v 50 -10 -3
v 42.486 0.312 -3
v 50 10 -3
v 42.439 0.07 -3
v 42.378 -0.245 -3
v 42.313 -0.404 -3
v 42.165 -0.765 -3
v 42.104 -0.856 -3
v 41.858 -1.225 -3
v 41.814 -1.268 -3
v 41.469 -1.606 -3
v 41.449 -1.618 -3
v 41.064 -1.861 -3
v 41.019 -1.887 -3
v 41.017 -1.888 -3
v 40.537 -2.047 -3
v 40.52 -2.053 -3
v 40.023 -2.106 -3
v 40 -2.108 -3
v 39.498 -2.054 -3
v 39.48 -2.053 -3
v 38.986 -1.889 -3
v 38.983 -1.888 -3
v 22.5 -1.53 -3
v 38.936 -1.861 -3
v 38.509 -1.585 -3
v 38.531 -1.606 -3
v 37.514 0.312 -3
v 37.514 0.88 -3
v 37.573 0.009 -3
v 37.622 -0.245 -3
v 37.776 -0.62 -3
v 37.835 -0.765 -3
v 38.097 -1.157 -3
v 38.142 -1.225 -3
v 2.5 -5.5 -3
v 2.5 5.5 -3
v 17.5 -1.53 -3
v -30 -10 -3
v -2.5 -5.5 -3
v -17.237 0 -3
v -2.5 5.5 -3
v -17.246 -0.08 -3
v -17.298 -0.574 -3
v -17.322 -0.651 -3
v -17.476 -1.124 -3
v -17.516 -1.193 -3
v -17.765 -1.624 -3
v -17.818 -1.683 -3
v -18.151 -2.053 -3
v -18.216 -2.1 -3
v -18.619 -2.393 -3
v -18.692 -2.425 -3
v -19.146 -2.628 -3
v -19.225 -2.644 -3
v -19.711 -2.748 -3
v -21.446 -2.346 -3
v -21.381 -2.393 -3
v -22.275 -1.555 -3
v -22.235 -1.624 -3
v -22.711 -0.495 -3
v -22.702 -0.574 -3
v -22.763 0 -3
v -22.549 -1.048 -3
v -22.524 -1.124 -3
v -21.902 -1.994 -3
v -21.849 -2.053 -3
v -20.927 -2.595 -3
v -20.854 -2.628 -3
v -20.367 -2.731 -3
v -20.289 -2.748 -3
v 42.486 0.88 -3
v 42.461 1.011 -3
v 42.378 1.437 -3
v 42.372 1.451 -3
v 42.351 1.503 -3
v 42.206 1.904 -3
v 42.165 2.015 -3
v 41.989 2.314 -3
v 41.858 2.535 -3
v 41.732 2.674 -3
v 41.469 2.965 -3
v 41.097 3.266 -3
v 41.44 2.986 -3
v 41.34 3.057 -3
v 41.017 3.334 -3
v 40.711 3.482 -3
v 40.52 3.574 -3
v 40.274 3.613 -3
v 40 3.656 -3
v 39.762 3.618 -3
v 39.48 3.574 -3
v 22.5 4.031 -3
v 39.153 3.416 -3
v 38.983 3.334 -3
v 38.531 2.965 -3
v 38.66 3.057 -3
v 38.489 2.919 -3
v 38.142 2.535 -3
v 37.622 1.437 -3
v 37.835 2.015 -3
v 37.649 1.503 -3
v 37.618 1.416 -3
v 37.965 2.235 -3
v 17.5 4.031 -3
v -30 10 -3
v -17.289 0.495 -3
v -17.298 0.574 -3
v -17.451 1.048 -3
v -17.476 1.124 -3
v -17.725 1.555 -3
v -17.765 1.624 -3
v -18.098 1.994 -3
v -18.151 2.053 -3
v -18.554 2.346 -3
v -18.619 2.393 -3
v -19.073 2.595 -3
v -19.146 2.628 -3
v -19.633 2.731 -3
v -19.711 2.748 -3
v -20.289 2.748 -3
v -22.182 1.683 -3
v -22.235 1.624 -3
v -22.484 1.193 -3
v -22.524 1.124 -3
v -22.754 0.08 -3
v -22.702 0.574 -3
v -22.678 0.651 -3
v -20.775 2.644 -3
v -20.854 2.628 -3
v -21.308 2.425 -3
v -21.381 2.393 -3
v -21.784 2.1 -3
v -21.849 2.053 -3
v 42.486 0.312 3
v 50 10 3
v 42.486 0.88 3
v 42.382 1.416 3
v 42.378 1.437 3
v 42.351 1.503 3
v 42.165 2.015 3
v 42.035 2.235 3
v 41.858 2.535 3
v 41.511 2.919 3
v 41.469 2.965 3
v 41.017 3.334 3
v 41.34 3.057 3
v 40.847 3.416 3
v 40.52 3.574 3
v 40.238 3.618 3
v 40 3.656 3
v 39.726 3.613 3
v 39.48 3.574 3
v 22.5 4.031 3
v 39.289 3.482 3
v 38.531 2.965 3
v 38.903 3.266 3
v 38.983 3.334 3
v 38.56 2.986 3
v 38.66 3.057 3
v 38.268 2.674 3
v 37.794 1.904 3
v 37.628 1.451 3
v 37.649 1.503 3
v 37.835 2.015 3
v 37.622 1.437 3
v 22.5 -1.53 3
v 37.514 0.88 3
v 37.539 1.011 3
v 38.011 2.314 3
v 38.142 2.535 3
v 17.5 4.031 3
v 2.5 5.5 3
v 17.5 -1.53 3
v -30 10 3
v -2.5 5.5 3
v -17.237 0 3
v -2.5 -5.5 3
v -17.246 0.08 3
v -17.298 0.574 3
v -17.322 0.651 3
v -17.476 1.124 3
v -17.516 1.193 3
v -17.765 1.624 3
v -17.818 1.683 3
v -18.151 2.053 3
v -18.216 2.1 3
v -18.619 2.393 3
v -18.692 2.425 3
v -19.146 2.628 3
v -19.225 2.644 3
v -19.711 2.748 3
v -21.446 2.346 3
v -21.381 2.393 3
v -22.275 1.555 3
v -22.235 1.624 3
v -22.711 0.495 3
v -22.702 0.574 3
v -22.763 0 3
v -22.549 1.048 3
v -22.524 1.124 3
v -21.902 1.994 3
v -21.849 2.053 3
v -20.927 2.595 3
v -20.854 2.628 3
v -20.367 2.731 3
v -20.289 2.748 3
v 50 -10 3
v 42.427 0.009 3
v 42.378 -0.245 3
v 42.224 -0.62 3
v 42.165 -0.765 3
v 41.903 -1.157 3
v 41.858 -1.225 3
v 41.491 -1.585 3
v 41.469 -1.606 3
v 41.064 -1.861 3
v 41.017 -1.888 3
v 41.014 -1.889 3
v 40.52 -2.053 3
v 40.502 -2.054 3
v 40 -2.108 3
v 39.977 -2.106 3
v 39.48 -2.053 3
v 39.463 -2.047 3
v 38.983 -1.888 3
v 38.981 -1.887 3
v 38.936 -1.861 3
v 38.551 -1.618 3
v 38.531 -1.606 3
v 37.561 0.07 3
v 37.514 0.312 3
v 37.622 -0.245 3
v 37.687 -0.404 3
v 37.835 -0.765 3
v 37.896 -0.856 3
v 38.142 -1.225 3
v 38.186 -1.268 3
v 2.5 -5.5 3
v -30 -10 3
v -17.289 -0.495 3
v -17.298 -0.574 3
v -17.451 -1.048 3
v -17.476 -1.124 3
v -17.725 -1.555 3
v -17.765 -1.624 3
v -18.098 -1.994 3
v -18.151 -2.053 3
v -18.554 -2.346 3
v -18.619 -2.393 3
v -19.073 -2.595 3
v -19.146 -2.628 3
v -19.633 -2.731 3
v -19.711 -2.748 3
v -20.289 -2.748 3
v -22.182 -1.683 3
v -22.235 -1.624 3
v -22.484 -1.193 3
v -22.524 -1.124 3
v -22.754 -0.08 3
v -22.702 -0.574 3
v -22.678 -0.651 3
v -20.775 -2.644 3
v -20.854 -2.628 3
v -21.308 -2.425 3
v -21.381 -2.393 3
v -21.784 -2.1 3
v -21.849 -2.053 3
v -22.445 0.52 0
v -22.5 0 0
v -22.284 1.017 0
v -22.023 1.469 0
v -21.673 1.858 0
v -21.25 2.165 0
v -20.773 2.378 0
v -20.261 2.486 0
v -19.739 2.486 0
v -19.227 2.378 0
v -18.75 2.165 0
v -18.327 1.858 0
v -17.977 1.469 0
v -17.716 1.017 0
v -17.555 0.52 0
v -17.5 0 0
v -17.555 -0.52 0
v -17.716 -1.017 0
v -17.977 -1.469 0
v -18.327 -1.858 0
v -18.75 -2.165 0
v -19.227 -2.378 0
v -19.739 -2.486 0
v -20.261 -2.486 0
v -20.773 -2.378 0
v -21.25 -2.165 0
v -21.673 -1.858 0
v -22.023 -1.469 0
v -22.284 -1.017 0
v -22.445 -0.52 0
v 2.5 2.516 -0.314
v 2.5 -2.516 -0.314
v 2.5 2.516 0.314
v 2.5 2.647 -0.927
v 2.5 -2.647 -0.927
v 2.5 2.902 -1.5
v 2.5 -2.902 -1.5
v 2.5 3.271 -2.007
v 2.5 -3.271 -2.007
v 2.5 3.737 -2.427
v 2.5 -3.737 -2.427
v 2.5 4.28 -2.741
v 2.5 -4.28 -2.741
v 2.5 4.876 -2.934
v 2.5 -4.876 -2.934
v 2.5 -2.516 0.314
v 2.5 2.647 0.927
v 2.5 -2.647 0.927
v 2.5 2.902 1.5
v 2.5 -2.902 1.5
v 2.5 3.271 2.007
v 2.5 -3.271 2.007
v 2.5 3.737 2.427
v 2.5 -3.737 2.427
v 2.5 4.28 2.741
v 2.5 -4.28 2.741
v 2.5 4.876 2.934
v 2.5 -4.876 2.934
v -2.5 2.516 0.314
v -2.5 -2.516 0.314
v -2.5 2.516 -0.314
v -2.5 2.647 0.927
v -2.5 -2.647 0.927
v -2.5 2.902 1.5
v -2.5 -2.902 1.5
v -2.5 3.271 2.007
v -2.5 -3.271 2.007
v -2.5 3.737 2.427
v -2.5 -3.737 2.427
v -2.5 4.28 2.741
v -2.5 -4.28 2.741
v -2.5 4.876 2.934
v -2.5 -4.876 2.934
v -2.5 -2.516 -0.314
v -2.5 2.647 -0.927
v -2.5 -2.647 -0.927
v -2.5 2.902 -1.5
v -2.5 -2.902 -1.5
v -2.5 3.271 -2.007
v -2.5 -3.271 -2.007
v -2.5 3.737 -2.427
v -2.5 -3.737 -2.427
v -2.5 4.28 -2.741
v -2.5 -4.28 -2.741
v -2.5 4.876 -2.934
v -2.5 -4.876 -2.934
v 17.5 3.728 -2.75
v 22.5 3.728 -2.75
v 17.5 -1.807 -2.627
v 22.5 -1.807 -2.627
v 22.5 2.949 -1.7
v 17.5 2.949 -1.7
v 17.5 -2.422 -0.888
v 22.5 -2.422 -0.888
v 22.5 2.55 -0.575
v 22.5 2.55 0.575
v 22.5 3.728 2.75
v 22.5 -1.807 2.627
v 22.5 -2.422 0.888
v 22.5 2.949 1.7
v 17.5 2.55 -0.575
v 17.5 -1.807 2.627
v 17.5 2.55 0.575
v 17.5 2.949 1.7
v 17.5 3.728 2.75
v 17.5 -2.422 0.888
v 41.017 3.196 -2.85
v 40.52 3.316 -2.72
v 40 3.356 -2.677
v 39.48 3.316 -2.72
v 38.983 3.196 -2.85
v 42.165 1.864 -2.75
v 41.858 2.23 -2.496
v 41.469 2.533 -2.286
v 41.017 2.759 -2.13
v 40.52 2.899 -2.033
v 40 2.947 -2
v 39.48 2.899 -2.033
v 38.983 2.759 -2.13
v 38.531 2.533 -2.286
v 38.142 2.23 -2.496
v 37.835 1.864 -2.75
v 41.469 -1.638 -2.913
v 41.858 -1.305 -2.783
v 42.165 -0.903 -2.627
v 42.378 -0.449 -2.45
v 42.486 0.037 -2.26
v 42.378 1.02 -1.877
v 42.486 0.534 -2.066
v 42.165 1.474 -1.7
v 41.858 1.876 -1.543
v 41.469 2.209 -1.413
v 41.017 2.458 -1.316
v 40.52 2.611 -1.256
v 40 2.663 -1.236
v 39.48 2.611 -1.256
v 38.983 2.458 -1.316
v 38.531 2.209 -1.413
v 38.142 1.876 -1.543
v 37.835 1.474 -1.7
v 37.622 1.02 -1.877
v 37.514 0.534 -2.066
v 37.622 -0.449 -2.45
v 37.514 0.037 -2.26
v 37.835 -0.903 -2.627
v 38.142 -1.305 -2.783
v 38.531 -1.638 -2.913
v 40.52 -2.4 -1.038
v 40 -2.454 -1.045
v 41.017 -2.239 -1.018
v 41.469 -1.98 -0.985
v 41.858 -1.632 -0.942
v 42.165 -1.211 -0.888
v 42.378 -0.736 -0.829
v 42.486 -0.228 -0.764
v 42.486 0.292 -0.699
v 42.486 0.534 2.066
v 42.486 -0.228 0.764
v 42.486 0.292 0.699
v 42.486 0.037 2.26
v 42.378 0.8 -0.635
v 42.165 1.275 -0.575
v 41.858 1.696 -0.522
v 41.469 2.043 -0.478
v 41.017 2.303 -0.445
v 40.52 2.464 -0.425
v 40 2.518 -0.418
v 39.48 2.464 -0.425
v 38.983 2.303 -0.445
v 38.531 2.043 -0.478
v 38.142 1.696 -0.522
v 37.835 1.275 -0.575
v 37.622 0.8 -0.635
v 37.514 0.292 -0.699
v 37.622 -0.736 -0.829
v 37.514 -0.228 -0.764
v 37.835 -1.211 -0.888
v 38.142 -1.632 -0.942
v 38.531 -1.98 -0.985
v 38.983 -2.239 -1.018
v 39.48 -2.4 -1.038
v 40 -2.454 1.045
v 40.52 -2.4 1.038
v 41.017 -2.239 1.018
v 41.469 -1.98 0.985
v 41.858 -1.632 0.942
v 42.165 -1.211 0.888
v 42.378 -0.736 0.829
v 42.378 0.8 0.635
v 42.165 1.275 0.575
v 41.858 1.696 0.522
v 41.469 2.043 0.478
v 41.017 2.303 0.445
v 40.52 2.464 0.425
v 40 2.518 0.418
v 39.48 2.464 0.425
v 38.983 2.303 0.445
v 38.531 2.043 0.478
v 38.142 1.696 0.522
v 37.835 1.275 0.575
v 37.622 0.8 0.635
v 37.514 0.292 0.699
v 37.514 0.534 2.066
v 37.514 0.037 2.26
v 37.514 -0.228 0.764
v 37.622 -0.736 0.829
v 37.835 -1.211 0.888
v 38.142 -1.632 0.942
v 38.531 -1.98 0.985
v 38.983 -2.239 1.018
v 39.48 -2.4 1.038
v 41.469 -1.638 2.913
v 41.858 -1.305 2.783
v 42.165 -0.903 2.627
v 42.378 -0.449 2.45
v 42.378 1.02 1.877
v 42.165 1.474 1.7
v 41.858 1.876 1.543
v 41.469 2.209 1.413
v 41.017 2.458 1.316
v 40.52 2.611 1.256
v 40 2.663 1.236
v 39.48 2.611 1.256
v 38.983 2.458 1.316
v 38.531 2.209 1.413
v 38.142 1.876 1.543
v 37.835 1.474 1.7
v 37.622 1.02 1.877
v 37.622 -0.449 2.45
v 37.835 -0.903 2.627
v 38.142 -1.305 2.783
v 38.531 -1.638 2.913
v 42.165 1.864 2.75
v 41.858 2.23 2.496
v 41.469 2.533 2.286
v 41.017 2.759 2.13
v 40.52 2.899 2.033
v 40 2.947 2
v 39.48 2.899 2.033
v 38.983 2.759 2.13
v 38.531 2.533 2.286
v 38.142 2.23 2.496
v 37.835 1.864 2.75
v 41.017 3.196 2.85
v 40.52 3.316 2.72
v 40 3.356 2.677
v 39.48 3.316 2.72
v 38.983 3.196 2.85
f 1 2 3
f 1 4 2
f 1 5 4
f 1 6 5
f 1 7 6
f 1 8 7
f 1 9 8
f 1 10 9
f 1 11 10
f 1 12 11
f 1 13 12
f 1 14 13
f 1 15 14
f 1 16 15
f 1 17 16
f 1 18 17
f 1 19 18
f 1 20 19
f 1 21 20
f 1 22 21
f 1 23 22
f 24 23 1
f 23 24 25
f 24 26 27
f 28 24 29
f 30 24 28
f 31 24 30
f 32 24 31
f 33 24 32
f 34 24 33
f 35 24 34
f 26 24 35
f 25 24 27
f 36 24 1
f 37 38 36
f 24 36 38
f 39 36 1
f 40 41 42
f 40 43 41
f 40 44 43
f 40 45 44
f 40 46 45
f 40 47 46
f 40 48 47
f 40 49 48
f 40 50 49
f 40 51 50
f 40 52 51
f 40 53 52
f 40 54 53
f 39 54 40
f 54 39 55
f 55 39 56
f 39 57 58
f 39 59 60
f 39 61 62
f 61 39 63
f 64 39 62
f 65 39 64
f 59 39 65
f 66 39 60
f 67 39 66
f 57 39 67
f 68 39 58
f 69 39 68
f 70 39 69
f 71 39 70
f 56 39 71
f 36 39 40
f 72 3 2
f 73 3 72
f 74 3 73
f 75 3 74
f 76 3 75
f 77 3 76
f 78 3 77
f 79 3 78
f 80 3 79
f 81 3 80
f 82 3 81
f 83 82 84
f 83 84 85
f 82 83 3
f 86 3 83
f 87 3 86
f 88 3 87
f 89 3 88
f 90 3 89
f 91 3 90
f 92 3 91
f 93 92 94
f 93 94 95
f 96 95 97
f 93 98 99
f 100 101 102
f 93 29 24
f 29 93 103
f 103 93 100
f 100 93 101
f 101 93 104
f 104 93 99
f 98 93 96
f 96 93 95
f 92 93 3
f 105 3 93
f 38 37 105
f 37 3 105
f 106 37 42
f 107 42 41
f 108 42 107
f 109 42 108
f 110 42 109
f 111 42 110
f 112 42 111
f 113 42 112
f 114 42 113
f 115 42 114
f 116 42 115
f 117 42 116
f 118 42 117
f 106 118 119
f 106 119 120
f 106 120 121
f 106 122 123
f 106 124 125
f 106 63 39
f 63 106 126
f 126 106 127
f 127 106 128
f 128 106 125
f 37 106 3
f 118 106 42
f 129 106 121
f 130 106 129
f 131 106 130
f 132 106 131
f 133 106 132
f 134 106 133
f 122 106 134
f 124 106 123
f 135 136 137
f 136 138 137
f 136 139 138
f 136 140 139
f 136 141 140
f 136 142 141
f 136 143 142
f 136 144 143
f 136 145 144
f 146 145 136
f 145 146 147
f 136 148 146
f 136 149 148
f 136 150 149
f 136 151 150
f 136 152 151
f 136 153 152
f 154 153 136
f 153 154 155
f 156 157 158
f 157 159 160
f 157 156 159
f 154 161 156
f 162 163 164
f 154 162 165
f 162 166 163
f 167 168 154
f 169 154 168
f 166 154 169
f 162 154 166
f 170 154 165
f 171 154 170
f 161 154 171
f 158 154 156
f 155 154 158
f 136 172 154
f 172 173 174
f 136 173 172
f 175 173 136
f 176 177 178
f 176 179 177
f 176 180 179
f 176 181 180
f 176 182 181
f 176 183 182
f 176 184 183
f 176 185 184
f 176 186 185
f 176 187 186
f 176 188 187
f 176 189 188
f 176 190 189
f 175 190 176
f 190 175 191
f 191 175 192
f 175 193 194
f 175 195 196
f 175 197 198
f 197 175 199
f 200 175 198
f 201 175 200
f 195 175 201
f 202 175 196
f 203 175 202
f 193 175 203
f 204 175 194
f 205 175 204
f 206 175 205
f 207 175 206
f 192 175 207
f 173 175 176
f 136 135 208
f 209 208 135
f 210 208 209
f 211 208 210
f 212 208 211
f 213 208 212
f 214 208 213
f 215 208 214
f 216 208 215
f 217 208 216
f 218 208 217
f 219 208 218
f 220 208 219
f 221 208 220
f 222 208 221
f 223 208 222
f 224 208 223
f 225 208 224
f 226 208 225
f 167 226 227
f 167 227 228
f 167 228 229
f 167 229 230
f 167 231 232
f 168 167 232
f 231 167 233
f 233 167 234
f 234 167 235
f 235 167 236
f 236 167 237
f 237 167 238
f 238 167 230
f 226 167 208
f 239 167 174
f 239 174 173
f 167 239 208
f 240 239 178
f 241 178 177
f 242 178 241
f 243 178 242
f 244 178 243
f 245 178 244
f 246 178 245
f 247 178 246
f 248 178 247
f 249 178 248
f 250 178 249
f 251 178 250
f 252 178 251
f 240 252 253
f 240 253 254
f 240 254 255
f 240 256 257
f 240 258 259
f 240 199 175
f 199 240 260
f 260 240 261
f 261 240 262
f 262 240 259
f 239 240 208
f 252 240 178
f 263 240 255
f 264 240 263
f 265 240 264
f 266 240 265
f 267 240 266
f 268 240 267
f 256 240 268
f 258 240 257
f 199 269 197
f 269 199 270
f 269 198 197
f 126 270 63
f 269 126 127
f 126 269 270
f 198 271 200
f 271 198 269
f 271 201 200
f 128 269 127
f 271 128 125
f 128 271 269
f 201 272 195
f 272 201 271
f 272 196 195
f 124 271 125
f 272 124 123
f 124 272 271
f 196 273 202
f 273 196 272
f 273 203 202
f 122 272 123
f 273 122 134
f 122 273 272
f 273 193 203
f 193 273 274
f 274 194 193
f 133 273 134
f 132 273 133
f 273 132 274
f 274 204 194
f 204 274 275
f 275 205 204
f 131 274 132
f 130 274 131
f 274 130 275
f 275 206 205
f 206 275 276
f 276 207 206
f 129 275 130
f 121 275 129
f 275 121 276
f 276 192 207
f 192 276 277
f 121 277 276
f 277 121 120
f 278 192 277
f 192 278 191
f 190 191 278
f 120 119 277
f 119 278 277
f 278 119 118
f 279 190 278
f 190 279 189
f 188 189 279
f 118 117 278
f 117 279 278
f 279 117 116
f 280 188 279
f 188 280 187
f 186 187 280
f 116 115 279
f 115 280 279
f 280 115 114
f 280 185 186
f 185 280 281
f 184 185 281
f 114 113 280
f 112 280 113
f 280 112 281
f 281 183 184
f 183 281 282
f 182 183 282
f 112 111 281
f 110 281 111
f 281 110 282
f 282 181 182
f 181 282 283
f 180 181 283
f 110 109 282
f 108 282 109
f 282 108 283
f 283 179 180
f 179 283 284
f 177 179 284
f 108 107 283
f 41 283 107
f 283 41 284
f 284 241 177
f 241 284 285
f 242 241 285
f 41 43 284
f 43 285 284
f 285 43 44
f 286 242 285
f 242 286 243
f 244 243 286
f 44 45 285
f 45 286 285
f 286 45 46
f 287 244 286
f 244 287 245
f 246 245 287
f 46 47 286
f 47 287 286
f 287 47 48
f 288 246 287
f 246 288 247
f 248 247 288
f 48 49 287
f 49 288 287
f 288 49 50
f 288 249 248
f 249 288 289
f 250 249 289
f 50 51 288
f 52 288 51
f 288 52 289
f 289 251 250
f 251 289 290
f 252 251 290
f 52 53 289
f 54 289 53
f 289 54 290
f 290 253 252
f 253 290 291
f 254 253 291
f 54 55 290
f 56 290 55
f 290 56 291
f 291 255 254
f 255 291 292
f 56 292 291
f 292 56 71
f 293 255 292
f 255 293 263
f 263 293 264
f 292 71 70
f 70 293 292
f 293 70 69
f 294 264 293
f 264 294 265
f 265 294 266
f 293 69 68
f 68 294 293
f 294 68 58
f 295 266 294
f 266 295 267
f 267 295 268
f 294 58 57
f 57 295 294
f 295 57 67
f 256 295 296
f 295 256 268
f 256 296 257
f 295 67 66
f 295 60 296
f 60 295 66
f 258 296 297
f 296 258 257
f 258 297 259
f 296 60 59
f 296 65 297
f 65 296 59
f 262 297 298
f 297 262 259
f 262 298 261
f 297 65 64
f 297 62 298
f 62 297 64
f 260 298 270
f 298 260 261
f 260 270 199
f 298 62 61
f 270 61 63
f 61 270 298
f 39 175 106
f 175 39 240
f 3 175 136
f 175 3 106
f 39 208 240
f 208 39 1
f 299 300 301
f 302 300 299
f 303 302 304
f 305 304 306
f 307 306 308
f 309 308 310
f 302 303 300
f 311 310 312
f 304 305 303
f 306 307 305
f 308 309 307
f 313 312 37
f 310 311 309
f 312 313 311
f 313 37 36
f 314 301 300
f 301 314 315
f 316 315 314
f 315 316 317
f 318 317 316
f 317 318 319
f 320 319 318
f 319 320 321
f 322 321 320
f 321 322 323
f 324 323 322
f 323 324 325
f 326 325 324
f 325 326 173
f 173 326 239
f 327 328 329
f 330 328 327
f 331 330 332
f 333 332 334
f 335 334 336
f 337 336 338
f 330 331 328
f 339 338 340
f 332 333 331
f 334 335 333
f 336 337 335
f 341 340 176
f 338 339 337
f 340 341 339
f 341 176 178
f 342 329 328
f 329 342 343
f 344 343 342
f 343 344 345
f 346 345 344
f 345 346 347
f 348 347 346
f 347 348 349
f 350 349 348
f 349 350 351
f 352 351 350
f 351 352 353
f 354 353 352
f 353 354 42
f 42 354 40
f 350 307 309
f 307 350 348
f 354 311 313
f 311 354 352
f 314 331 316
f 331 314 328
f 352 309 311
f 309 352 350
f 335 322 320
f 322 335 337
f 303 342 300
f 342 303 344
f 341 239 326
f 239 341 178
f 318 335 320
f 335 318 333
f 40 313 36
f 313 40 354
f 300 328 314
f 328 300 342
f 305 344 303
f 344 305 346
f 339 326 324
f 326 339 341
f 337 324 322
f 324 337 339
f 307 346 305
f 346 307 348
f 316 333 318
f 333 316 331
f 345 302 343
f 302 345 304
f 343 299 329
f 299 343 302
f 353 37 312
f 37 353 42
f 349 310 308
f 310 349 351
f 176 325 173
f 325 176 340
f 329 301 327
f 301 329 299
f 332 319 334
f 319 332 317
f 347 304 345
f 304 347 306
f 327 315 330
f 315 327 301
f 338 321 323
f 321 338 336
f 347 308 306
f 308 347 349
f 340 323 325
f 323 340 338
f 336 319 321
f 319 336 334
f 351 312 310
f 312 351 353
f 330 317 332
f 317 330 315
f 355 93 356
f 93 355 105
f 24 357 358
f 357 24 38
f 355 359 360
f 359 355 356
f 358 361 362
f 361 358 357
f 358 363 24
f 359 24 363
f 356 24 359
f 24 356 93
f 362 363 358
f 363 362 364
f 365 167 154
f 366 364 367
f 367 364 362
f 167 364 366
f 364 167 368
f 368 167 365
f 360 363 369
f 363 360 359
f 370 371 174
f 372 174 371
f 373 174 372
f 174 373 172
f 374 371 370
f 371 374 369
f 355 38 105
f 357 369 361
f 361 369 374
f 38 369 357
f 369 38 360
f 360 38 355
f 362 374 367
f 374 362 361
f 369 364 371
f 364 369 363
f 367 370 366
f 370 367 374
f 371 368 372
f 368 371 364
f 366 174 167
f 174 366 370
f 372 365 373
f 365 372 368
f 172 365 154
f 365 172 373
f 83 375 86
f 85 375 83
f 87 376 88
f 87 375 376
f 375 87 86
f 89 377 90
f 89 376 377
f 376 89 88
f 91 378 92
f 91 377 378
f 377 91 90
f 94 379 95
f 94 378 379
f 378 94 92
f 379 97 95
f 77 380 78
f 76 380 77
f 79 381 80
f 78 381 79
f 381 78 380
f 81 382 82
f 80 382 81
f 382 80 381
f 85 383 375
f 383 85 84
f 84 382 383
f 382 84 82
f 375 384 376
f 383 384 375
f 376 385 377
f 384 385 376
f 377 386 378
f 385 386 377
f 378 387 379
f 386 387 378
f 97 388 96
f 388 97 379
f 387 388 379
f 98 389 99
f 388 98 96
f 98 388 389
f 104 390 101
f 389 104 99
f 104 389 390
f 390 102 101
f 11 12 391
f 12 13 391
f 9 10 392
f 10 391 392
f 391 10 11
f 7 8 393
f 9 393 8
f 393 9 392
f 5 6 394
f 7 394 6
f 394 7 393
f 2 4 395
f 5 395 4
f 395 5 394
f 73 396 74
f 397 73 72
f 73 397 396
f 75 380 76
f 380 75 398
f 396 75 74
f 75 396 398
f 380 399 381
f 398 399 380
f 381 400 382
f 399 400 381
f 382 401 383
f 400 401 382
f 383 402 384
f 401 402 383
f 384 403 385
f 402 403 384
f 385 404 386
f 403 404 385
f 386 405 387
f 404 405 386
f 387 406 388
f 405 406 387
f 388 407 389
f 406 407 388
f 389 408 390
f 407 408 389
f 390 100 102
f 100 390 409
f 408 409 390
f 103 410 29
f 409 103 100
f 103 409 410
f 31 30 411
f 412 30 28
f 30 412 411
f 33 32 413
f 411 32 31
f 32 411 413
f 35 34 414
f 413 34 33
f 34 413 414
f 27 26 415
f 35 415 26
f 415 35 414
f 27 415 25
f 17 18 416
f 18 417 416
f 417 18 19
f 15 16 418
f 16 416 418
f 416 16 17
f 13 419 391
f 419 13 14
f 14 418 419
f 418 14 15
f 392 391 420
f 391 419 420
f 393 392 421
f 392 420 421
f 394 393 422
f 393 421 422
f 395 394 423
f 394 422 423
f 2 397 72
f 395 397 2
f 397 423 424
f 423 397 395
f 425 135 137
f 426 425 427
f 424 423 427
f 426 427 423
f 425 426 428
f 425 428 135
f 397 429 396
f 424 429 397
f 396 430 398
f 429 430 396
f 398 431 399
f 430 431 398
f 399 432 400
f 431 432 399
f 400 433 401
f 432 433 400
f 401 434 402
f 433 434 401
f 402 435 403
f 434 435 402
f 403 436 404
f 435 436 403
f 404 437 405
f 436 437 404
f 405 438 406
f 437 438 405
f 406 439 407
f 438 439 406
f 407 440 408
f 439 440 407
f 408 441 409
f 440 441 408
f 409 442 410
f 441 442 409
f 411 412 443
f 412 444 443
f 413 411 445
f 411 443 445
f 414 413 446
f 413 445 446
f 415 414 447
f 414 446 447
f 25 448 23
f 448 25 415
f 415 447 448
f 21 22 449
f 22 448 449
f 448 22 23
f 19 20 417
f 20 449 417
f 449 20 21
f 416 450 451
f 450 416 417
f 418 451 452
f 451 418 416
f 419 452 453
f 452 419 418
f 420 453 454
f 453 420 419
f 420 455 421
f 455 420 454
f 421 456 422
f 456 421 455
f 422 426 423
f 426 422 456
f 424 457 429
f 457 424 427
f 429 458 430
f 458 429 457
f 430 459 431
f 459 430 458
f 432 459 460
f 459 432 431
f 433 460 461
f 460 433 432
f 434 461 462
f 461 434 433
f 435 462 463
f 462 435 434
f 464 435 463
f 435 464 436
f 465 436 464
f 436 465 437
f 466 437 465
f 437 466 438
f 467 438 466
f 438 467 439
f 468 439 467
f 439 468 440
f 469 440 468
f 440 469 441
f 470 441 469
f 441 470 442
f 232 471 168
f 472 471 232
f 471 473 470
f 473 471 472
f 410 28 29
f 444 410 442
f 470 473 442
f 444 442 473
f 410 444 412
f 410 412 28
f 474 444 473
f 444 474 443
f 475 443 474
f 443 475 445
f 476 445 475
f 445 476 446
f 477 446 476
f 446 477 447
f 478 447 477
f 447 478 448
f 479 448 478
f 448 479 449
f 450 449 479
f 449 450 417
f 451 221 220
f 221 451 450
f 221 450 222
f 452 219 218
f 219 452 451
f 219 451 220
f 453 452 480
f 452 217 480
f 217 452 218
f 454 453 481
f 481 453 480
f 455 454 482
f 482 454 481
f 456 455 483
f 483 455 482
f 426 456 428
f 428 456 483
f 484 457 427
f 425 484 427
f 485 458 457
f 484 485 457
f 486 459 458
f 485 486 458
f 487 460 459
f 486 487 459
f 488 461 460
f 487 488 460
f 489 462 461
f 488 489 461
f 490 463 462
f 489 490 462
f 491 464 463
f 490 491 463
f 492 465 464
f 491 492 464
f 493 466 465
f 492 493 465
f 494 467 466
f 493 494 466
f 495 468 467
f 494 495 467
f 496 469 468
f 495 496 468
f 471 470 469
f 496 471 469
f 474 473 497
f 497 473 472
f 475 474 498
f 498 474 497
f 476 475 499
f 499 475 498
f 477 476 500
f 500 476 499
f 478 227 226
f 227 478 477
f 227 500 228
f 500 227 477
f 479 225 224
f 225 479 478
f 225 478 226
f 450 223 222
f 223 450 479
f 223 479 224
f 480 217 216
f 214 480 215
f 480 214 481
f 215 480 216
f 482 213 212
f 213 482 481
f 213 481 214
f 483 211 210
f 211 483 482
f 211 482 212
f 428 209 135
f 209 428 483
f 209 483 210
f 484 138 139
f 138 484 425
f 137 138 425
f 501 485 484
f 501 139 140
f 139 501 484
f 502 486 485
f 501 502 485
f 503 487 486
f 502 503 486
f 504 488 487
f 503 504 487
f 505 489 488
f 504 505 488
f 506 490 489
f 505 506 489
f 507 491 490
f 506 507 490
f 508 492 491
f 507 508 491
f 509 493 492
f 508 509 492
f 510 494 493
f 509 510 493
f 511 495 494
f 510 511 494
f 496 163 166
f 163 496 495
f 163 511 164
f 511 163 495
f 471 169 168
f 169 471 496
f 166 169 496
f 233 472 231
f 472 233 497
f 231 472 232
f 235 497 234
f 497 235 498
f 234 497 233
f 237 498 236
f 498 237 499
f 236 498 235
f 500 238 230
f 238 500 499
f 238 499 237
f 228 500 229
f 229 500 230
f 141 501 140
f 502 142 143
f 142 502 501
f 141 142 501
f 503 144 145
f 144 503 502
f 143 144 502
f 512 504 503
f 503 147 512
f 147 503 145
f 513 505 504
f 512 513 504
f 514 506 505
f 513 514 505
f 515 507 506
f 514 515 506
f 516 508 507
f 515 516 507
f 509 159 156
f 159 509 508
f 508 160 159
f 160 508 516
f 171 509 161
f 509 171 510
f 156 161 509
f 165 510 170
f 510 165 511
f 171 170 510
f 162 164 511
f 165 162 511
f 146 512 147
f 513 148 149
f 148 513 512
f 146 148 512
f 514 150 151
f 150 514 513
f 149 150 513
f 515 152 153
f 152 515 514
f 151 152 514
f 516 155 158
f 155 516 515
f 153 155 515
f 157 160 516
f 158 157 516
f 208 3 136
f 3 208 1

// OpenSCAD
// roundhole cuts a round beveled hole through x-y plane in a child shape. The
// hole will be scaled to have width, height, and depth dimensions. The scaling
// factor should be greather than 1 and controls the curvature of
// the round hole bevel. 1 is maximum, and greater number is less curvature.
//
// Example usage:
//   roundhole(5, 5, 5, 1.0) cube(size=[20, 20, 20], center=true);
//
module roundhole(width, height, depth, s) {
  radius = depth/2;
	S = (s <= 0 ? 0 : 1/s);
  trans = radius + S*radius;

  difference() {
    children();

    // Create "netagive" form of an hour-glass to subtract from children above.
    scale([width/depth, height/depth, 1]) {
      difference() {
        // create a cylinder and subtract a torus to leave an 'hour-glass' shape.
        cylinder(h=depth, r=depth, center=true);
        rotate_extrude(convexity = 10) {
          translate([trans, 0, 0]) circle(r=S*radius);
        }
      }
    }
  }
}

// beveledhole cuts a hole through x-y plane in a child shape. The top and
// bottom surfaces are beveled with a radius depth/2. The hole will be scaled
// to width, height, depth dimensions. 
//
// Example usage:
//   beveledhole(5, 5, 5) cube(size=[20, 20, 20], center=true);
//
module beveledhole(width, height, depth) {
  // the area that will be subtracted has a slightly larger w & h.
	// but the opening will be limited to width & height.
  w = width;
  // w = width + depth;  // use this width if adding bevel to left & right walls.
  h = height + depth;
  r = depth / 2;

  difference() {
    children();

    // create "negative" form of beveled hole to subtrace from chidren above.
    difference(){
      // start with cube, and subtrace columns on each side.
      cube(size=[w,h,depth], center=true);

      // left & right walls.
      //rotate([90,0,0]) translate([ w/2, 0, 0]) cylinder(h=h, r=r, center=true);
      //rotate([90,0,0]) translate([-w/2, 0, 0]) cylinder(h=h, r=r, center=true);

      // top & bottom walls.
      rotate([0,90,0]) translate([0, -h/2, 0]) cylinder(h=w, r=r, center=true);
      rotate([0,90,0]) translate([0,  h/2, 0]) cylinder(h=w, r=r, center=true);
    }
  }
}

// squaredonuthole cuts a square "donut" hole through x-y plane of a child
// shape.  donut_radius is the radius of the donut that will be created. The
// intersection of this donut with the child shape is removed. A smaller radius
// creates a more pronounced curve. The hole is scaled to width, height, depth
// dimensions.
// 
// Example usage:
//     squaredonuthole(5, 5, 6, 7) cube(size=[20, 20, 6], center=true);
//
module squaredonuthole(width, height, depth, donut_radius) {
  radius = depth/2; 

  difference() {
    children();

    intersection() {
      scale([width/radius, height/radius, 1]) {
        translate([0, donut_radius, 0]) rotate([0, 90, 0]) {
          rotate_extrude(convexity = 10) {
            // rotate_extrude must start as an offset from x axis.
            translate([donut_radius, 0, 0]) square(radius, center=true);
          }
        }
      }
      scale([1, height/radius, 1])
        cube(size=[width, height, depth], center=true);
    }
  }
}


// helper functions for calculating the height of a donut arch segment.
function h(depth, tradius) = tradius - depth/2;
function b(depth, h) = sqrt( abs(pow(h, 2) - pow(depth/2, 2)) );
function archeight(depth, radius) = depth + h(depth, radius) - b(depth, h(depth, radius));

// donuthole cuts a round "donut" hole through x-y plane of a child shape.
// donut_radius is the radius of the donut that will be created. The
// intersection of this donut with the child shape is removed. A smaller radius
// creates a more pronounced curve. The hole is scaled to width, height, depth
// dimensions.
// 
// Example usage:
//     donuthole(5, 5, 6, 7) cube(size=[20, 20, 6], center=true);
//
module donuthole(width, height, depth, donut_radius) {
  radius = depth/2; 

  echo("cube:", [depth, archeight(depth, donut_radius), depth]);
  difference() {
    children();
    scale([width/depth, height/depth, 1]) {
      intersection() {
        translate([0, (radius)/2, 0])
          cube(size=[depth, donut_radius+radius, depth], center=true);

        translate([0, donut_radius, 0]) rotate([0, 90, 0]) {
          rotate_extrude(convexity = 10) {
            // rotate_extrude must start as an offset from x axis.
            translate([donut_radius, 0, 0]) circle(r=radius);
          }
        }
      }
    }
  }
}


// all circles are renedered using fn number of segments.
// higher value for more detail, but slower rendering.
// lower value for less detail and faster rendering.
// (I don't know if this affects the STL export or not.)
$fn = 30;

samplesize = [20,20,6];

translate([-20,0,0])
  roundhole(5, 5, 6, 0.01) cube(size=samplesize, center=true);

translate([0,0,0])
  beveledhole(5, 5, 6) cube(size=samplesize, center=true);

translate([20,0,0])
  squaredonuthole(5, 5, 6, 7) cube(size=samplesize, center=true);

translate([40,0,0])
  donuthole(5, 5, 6, 7) cube(size=samplesize, center=true);
